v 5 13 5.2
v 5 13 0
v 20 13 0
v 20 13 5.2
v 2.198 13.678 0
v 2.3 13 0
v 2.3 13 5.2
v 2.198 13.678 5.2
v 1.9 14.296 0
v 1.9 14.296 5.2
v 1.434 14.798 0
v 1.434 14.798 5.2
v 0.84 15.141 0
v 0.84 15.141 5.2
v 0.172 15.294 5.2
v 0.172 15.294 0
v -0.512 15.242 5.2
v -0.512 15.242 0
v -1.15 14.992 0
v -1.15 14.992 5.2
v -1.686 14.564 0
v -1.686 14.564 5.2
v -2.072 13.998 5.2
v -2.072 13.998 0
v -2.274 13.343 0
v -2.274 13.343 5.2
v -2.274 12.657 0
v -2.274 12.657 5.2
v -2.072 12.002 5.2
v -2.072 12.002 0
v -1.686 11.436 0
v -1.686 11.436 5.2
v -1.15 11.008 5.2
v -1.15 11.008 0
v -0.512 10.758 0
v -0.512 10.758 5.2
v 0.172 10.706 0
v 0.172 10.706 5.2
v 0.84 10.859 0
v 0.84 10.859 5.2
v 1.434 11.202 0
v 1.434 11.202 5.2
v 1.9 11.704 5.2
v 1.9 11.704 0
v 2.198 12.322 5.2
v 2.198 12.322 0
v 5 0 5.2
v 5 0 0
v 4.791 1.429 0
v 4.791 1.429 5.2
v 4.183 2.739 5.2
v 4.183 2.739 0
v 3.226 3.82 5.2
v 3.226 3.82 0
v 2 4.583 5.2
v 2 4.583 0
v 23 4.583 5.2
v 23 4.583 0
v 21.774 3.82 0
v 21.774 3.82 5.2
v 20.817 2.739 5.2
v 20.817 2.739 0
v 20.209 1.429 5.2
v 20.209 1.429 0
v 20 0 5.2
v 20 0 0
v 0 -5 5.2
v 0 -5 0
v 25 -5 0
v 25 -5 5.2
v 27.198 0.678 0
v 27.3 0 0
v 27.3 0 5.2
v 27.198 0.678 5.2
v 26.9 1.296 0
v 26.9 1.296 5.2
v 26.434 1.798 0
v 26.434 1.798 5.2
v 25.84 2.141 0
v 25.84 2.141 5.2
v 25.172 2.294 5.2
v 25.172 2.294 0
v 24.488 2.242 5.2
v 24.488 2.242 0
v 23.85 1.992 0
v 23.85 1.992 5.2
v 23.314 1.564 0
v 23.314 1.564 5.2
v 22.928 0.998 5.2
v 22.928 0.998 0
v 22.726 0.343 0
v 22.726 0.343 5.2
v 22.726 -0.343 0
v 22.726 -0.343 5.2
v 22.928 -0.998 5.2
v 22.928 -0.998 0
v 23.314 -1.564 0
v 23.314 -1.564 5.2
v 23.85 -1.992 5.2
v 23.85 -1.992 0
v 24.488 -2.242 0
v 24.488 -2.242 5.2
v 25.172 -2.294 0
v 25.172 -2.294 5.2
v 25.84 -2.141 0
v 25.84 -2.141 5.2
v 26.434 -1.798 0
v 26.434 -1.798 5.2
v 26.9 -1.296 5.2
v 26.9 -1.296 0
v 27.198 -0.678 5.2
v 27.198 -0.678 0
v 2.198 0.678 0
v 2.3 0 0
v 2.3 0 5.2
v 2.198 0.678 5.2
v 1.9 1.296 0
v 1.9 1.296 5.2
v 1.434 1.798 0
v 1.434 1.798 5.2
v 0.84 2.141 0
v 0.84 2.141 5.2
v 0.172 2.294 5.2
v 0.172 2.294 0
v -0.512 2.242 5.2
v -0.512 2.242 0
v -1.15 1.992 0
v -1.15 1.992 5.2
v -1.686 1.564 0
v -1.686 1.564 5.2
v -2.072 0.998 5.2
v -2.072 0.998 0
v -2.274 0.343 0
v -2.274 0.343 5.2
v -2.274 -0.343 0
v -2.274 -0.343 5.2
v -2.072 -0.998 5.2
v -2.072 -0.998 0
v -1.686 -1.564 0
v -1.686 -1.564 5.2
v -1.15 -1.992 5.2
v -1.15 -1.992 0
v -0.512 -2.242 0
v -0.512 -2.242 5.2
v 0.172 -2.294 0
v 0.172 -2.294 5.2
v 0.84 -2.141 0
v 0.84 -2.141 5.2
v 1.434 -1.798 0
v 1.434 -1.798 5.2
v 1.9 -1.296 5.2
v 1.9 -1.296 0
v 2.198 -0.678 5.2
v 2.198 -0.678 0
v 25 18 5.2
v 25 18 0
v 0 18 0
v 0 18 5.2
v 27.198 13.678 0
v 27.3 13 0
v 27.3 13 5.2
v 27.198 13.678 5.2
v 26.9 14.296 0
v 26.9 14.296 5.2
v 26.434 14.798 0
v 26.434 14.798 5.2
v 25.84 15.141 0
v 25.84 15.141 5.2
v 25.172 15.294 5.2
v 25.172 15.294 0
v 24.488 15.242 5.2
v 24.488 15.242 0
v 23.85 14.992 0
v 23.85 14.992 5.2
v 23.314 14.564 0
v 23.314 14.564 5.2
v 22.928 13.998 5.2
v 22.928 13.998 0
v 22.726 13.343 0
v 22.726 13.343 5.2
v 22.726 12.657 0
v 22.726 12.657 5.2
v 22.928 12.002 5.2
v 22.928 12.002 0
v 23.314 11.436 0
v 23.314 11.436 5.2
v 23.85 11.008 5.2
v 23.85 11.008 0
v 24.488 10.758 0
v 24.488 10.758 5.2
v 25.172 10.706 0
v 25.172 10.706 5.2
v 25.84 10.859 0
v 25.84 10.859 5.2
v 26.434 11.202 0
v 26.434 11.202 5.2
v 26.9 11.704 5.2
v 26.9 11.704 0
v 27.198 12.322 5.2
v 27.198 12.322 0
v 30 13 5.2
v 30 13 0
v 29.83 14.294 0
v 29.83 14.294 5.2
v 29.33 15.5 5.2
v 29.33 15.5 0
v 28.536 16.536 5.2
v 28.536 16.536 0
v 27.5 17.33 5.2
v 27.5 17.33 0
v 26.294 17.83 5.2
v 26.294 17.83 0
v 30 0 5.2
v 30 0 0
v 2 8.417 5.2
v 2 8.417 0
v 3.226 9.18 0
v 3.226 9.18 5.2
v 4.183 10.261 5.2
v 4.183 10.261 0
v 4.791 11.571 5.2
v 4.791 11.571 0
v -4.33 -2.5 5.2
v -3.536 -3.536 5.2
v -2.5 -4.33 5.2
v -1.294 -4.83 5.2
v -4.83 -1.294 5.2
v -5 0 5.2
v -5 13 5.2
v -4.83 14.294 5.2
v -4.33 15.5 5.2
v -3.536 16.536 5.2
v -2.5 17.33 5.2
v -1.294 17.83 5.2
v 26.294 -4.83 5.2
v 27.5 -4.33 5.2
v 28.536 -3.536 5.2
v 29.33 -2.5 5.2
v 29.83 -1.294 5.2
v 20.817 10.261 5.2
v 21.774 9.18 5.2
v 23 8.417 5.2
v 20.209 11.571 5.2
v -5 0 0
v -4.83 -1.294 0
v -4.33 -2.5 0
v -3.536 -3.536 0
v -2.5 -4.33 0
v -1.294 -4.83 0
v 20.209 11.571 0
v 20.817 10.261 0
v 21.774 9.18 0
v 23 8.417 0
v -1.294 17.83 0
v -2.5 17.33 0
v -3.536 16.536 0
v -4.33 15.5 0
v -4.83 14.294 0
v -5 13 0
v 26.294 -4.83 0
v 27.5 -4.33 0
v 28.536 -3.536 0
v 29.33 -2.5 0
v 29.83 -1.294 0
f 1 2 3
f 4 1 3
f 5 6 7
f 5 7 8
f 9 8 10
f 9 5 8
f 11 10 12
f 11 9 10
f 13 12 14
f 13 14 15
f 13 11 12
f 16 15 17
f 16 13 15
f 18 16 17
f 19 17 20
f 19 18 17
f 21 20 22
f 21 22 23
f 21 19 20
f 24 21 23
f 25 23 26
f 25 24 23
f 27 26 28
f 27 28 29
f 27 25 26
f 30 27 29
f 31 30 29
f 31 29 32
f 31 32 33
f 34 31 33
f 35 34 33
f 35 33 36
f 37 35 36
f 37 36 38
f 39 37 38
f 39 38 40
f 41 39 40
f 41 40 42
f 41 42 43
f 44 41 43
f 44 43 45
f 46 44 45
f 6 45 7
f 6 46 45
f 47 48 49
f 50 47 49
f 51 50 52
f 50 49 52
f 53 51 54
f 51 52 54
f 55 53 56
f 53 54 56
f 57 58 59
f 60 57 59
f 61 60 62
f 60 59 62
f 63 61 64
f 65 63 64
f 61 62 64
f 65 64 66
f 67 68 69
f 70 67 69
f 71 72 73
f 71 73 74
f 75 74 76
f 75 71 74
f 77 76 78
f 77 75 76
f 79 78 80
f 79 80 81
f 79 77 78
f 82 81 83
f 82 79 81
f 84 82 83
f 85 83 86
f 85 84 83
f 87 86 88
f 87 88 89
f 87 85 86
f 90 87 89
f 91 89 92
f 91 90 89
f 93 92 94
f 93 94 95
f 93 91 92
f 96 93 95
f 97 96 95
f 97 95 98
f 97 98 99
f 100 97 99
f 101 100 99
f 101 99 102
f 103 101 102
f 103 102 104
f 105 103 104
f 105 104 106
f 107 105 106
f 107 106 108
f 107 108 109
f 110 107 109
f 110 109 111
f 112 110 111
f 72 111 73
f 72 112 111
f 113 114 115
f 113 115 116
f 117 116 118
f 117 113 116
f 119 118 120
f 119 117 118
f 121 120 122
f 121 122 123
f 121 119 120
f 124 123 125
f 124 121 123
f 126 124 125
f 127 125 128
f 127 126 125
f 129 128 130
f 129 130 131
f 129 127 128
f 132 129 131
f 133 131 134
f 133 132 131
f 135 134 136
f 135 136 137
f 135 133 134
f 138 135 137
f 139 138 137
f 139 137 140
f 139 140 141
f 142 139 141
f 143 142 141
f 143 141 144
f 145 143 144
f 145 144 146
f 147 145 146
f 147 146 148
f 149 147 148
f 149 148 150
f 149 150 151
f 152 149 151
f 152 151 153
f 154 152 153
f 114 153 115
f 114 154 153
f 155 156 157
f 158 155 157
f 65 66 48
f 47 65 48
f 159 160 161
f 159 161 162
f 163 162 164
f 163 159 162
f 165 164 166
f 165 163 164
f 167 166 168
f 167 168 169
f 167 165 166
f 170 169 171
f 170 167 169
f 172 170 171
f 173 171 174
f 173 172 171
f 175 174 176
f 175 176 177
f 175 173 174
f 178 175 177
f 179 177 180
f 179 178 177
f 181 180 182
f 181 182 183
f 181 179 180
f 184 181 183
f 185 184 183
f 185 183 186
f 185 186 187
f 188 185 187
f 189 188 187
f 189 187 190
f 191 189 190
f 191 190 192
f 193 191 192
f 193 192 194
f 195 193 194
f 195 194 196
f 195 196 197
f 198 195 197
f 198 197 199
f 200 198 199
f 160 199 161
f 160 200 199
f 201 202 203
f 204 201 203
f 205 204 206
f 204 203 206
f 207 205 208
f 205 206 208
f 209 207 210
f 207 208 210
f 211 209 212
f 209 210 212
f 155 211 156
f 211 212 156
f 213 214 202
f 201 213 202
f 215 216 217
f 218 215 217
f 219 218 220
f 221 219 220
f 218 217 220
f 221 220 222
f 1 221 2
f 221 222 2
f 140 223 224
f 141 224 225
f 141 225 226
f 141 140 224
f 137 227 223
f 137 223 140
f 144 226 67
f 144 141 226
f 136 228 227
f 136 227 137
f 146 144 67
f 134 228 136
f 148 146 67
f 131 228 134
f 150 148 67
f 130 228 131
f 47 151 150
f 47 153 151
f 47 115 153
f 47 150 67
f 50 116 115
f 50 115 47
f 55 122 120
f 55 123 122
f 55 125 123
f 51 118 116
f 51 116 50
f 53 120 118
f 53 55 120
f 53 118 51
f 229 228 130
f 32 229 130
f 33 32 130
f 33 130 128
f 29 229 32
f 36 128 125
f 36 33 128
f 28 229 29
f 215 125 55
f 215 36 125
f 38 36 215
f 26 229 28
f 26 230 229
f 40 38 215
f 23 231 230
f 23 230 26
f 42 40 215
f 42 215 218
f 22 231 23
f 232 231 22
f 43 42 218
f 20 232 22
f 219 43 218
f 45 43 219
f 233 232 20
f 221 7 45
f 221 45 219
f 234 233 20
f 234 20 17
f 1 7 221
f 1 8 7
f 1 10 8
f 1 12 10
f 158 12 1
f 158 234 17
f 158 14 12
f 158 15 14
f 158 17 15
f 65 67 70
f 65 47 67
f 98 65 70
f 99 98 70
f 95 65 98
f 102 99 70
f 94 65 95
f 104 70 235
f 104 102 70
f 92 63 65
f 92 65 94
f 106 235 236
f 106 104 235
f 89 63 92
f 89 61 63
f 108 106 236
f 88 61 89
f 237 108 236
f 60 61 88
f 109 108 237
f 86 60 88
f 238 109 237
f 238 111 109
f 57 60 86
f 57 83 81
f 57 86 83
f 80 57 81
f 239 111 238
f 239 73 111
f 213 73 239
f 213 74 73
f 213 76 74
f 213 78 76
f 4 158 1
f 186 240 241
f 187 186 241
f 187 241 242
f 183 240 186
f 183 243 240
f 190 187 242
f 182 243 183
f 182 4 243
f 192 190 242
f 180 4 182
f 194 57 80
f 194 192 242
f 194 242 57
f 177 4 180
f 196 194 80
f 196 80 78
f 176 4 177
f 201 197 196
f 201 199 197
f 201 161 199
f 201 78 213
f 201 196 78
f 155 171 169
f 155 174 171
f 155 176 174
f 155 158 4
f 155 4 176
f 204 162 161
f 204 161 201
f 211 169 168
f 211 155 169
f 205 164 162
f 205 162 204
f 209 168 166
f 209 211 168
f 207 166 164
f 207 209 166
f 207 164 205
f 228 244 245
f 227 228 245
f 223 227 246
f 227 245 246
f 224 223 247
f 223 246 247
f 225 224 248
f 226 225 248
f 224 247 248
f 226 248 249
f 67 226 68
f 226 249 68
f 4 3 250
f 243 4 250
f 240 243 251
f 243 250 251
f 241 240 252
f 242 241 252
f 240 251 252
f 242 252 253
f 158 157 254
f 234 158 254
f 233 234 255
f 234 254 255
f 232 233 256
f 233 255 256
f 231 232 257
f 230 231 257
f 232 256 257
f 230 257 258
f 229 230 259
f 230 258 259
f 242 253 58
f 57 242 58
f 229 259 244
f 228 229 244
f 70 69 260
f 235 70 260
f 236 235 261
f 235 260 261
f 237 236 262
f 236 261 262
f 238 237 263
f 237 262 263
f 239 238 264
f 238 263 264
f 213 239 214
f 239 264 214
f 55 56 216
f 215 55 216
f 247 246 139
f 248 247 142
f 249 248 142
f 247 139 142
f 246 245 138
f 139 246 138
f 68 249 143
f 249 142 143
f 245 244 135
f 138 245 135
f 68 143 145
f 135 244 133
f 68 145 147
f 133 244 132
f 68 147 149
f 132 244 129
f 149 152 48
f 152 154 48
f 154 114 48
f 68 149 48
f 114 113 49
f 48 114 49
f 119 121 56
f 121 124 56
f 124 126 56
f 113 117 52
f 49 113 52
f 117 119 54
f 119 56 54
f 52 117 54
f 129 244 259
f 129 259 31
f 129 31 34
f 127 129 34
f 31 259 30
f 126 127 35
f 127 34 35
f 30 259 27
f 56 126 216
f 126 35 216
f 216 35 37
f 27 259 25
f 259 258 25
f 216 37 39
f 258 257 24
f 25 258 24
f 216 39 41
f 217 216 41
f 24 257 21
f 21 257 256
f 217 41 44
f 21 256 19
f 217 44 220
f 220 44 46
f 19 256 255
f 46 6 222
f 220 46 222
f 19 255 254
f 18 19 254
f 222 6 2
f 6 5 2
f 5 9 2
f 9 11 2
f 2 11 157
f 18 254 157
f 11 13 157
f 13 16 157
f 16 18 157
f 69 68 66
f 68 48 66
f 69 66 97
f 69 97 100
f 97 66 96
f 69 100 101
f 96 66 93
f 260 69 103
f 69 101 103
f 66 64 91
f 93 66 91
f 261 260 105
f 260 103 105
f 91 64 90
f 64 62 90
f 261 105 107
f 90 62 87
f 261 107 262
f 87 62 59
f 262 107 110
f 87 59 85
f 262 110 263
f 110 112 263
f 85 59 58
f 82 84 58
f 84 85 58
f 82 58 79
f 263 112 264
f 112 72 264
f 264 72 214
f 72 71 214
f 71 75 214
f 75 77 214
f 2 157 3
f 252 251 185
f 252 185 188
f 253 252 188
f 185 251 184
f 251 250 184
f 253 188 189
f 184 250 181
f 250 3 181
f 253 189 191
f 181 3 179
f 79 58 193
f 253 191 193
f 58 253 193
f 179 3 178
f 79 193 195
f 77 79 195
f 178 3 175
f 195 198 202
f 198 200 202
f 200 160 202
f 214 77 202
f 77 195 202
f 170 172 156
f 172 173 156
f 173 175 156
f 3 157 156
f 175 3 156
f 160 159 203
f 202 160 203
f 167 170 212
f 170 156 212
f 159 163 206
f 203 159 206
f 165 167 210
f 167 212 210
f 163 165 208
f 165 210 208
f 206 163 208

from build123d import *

# Parameters (mm, degrees)
SKETCH_1_R      = 2.3
EXTRUDE_1_DEPTH = 5.2


with BuildPart() as part:
    # 草图1 → 凸台-拉伸1 (new body)
    with BuildSketch(Plane.XY):
        with BuildLine():
            Line((-5, 13), (-5, 0))
            ThreePointArc((-5, 0), (-3.535533906, -3.535533906), (0, -5))
            Line((0, -5), (25, -5))
            ThreePointArc((25, -5), (28.535533906, -3.535533906), (30, 0))
            Line((30, 0), (30, 13))
            ThreePointArc((30, 13), (28.535533906, 16.535533906), (25, 18))
            Line((25, 18), (0, 18))
            ThreePointArc((0, 18), (-3.535533906, 16.535533906), (-5, 13))
        make_face()
        with Locations((0, 13)):
            Circle(SKETCH_1_R, mode=Mode.SUBTRACT)
        with Locations((25, 13)):
            Circle(SKETCH_1_R, mode=Mode.SUBTRACT)
        Circle(SKETCH_1_R, mode=Mode.SUBTRACT)
        with Locations((25, 0)):
            Circle(SKETCH_1_R, mode=Mode.SUBTRACT)
        with BuildLine():
            Line((5, 13), (20, 13))
            ThreePointArc((20, 13), (20.816699867, 10.261387212), (23, 8.417424305))
            Line((23, 8.417424305), (23, 4.582575695))
            ThreePointArc((23, 4.582575695), (20.816699867, 2.738612788), (20, 0))
            Line((20, 0), (5, 0))
            ThreePointArc((5, 0), (4.183300133, 2.738612788), (2, 4.582575695))
            Line((2, 4.582575695), (2, 8.417424305))
            ThreePointArc((2, 8.417424305), (4.183300133, 10.261387212), (5, 13))
        make_face(mode=Mode.SUBTRACT)
    extrude(amount=EXTRUDE_1_DEPTH)


solid = part.part
